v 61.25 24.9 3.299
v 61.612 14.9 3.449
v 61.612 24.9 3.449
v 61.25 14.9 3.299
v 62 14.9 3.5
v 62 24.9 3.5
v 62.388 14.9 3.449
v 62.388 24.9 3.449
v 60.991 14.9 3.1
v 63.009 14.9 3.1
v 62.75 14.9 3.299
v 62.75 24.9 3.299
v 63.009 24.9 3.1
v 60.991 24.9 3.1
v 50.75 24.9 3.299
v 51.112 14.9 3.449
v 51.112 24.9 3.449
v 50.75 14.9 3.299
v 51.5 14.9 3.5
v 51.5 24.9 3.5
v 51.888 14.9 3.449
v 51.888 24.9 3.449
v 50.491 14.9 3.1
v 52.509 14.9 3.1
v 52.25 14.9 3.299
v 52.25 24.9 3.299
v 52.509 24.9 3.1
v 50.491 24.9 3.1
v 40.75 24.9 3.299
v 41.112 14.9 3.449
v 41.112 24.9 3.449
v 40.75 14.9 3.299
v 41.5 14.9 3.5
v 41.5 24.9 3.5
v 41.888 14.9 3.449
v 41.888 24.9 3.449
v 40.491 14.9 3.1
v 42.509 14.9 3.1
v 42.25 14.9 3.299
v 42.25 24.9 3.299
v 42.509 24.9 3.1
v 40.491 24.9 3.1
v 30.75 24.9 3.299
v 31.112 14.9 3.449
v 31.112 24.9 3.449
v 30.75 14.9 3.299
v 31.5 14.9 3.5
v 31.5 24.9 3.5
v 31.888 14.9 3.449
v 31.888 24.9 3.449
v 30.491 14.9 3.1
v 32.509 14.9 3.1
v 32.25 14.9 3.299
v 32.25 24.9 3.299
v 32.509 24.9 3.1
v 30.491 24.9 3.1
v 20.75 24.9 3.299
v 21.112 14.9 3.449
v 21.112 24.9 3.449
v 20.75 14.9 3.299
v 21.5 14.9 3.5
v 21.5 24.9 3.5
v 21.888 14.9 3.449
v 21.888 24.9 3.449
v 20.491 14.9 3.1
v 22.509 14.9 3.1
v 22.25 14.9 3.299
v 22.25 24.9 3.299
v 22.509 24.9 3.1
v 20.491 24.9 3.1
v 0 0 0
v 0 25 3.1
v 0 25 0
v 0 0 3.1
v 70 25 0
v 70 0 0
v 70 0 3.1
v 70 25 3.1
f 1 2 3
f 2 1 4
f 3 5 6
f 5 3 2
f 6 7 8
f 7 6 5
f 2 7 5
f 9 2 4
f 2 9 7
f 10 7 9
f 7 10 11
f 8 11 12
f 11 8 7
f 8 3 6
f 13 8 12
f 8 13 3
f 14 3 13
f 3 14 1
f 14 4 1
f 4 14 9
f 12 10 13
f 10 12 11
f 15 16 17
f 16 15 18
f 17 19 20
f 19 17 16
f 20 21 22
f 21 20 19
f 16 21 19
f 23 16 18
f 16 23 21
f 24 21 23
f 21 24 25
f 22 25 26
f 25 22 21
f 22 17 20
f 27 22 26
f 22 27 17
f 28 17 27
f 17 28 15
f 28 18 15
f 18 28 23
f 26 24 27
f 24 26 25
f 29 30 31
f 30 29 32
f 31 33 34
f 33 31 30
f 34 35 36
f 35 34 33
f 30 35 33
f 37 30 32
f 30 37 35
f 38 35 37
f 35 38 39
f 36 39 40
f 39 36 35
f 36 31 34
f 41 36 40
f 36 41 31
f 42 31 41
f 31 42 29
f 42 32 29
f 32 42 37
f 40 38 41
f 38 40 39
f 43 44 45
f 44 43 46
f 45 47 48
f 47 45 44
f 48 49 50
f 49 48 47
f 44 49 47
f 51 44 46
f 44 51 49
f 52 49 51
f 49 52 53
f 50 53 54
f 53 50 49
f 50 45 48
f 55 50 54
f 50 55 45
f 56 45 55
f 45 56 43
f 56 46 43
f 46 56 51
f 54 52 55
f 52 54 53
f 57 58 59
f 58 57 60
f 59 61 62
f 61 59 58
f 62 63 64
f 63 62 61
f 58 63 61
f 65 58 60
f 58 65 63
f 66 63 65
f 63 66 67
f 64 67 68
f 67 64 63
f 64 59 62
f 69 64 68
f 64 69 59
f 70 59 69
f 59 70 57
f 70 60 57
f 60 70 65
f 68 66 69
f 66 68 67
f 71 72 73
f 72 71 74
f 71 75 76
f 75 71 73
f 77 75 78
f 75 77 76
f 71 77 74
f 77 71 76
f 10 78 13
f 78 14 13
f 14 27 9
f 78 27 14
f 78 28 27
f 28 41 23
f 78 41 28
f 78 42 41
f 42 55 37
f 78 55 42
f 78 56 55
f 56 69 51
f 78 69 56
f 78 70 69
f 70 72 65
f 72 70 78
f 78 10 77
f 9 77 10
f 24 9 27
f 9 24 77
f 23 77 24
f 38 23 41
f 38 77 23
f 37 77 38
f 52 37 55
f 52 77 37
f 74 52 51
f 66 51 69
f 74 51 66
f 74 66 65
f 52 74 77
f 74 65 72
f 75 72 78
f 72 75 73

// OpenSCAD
// file: keyboard.scad
keyboard_size = [70, 15, 1];
key_height = 2;
keyboard_thickness_max = keyboard_size[2] + key_height + 0.1;

module keys() { //按键加LED排布
    module key() {
        translate([0, -1, 1])cube(size=[4,2,key_height], center=true);
        translate([0, 4.9, 1])rotate([90, 0, 0])
        cylinder(r=1.5, h=10, center=true);
    }
    module led() {
        translate([0, -1, 1])cube(size=[4,2,key_height], center=true);
        translate([0, 4, 1])rotate([90, 0, 0])
        cylinder(r=1, h=10, center=true);
    }
    key_spacing = 10;//按键间距一厘米
    key_loc_begin = [8, 18.5];//最开始的两个间距比较特殊
    key_loc = concat(key_loc_begin, [for (i = [1:3]) key_loc_begin[1]+i*key_spacing]);
    led_loc = key_loc_begin[1] + 3*key_spacing + 8;//LED距离最后一个按键距离为8mm
    for (loc=key_loc)translate([loc,0,0])key();
    translate([led_loc,0,0])led();
}

module keyboard(cutout = false) { //按键板
    module _keyboard(cutout = false) { //调整位置前的按键板
        if (cutout) {
            translate([0, 0, keyboard_size[2]-keyboard_thickness_max])
            cube(size=[keyboard_size[0], keyboard_size[1]+10, keyboard_thickness_max]);
        }else{
            translate([0, 15, -2])keys();
            cube(size=keyboard_size);
        }
    }
    translate([keyboard_size[0], 0, 0])
    rotate([0,180,0])
    translate([0, 0, -keyboard_size[2]])
    _keyboard(cutout);
}
// main file
include <keyboard.scad>
$fa = 1;
$fs = 0.4;
keyboard();
#keyboard(true);
